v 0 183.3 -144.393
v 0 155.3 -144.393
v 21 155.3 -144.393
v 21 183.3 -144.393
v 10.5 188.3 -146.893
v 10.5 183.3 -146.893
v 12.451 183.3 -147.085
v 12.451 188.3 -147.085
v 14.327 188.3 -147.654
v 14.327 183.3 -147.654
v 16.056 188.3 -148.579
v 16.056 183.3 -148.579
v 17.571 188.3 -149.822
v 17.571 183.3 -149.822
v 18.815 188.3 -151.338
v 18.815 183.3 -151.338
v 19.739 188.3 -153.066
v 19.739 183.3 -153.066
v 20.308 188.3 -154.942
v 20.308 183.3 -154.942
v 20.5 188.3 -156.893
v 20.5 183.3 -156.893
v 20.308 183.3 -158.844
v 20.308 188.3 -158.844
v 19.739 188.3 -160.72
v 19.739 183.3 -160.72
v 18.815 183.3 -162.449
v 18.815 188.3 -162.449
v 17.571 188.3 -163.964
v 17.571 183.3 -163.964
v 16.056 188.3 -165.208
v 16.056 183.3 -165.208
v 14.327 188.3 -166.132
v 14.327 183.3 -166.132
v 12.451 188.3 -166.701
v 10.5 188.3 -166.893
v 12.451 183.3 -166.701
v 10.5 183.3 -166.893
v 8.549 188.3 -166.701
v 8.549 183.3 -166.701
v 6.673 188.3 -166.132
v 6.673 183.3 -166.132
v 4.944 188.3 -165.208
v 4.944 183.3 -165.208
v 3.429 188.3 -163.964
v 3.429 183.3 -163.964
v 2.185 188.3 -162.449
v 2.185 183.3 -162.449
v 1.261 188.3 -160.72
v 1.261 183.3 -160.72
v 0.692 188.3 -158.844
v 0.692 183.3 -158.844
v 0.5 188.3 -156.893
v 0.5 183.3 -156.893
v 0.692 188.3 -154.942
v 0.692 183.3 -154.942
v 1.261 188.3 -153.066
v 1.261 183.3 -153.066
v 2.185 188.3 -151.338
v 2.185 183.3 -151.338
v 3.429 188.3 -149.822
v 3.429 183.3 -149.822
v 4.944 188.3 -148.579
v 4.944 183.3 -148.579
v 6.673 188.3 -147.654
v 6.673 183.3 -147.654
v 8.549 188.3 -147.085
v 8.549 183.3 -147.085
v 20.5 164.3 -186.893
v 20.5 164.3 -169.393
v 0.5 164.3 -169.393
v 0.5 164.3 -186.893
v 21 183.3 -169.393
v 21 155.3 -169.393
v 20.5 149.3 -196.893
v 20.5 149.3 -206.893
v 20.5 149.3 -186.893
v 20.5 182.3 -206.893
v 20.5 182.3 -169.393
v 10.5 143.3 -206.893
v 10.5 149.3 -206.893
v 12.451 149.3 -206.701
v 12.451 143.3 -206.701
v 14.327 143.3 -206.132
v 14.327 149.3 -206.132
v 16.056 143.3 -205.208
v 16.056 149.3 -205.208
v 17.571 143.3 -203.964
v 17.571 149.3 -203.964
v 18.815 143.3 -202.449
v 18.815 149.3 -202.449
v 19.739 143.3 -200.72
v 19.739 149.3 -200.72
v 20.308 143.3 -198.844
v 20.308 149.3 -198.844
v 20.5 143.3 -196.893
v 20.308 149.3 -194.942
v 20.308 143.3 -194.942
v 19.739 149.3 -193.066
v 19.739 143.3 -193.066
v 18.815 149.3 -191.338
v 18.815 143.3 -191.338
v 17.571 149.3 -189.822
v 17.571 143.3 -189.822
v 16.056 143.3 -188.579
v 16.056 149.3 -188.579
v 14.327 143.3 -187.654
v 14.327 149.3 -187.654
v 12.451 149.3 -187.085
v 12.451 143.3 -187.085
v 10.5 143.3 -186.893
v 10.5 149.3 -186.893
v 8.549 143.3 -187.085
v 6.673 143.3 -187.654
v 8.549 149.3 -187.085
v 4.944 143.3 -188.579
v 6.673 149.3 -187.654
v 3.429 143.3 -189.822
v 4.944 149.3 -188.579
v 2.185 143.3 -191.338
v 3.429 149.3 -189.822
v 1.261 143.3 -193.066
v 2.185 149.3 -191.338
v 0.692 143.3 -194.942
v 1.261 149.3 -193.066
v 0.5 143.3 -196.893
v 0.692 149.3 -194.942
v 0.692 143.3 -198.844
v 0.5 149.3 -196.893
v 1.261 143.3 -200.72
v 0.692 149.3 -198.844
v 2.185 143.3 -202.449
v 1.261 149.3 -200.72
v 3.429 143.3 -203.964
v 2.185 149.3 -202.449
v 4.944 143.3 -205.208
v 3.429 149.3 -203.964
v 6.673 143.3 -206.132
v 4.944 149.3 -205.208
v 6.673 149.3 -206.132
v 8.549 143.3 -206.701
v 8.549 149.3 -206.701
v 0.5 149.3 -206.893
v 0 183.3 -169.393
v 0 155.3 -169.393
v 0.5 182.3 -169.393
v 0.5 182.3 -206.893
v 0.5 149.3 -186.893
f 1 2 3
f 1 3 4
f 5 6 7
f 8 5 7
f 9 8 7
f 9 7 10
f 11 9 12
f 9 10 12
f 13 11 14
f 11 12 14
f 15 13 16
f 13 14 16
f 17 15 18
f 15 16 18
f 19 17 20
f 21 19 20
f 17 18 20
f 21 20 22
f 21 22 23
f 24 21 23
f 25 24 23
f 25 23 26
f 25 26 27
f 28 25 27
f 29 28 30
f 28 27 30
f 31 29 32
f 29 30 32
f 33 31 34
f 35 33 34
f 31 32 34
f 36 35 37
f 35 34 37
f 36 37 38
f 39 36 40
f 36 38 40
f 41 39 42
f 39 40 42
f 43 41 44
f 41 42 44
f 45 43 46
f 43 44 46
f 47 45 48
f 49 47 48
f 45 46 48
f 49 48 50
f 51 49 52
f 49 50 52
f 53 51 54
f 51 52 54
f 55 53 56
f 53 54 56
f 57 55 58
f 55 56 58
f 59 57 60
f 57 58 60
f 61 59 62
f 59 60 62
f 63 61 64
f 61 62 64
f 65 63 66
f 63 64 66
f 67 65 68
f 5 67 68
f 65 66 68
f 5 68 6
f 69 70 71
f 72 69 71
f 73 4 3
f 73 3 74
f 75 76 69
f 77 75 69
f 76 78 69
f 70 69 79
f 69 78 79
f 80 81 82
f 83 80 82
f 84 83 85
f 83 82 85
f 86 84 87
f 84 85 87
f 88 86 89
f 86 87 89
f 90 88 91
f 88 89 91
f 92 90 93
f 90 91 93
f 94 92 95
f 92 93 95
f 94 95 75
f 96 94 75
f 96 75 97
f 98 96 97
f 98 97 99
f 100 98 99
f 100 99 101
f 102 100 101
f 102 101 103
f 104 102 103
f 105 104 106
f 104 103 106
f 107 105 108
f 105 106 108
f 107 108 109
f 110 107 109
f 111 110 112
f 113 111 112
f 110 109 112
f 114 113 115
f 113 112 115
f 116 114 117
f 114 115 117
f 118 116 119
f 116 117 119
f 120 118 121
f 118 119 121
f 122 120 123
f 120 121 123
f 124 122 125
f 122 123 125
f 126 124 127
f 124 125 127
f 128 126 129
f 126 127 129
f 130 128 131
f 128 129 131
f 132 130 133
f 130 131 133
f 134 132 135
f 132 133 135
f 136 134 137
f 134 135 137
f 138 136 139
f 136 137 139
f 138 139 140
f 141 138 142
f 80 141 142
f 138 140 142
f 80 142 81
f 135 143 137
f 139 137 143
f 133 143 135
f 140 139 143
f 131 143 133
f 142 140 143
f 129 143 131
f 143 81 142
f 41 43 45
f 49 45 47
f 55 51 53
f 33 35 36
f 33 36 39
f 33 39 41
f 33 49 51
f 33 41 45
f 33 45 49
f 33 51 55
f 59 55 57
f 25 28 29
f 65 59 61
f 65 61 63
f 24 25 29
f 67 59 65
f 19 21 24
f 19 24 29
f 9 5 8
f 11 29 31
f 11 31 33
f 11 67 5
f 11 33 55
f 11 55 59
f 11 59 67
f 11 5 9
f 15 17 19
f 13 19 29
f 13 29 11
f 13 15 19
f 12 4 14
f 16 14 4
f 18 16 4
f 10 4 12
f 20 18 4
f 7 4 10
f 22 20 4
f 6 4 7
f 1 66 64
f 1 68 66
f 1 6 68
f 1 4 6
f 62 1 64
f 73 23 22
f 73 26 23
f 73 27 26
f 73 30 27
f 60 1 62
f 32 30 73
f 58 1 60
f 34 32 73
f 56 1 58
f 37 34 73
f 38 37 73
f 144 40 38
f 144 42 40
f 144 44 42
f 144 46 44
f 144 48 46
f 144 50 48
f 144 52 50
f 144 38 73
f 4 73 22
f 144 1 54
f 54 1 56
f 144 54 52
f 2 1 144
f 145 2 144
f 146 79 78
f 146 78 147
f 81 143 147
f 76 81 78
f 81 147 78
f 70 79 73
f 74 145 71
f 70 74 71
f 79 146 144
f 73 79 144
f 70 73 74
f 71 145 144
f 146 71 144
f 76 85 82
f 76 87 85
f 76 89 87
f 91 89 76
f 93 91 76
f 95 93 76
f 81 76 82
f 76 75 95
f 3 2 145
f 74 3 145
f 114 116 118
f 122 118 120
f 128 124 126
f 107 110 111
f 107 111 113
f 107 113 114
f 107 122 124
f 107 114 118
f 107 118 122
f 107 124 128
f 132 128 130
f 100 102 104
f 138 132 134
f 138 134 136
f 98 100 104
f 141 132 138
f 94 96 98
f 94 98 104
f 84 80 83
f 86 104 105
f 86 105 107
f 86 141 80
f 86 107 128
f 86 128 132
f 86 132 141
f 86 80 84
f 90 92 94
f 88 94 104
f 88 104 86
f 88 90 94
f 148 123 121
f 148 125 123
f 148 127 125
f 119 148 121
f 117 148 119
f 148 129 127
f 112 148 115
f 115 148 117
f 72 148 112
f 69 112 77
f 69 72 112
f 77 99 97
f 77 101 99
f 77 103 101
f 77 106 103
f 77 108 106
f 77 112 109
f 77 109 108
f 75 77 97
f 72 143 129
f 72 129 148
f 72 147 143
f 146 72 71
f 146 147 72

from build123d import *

# Parameters (mm, degrees)
ESQUISSE1_W        = 25
ESQUISSE1_H        = 28
BOSS_EXTRU_1_DEPTH = 21
ESQUISSE2_W        = 20
ESQUISSE2_H        = 18
BOSS_EXTRU_2_DEPTH = 37.5
ESQUISSE3_W        = 20
ESQUISSE3_H        = 20
BOSS_EXTRU_3_DEPTH = 15
ESQUISSE5_R        = 10
BOSS_EXTRU_4_DEPTH = 5
ESQUISSE6_R        = 10
BOSS_EXTRU_5_DEPTH = 6


with BuildPart() as part:
    # Esquisse1 → Boss.-Extru.1 (new body)
    with BuildSketch(Plane(origin=(0, 0, 0), x_dir=(0, 0, -1), z_dir=(1, 0, 0))):
        with Locations((156.893217971, 169.300046999)):
            Rectangle(ESQUISSE1_W, ESQUISSE1_H)
    extrude(amount=BOSS_EXTRU_1_DEPTH)

    # Esquisse2 → Boss.-Extru.2 (add)
    with BuildSketch(Plane(origin=(0, 0, -169.393217971), x_dir=(-1, 0, 0), z_dir=(0, 0, -1))):
        with Locations((-10.5, 173.300046999)):
            Rectangle(ESQUISSE2_W, ESQUISSE2_H)
    extrude(amount=BOSS_EXTRU_2_DEPTH)

    # Esquisse3 → Boss.-Extru.3 (add)
    with BuildSketch(Plane.XZ.offset(-164.300046999)):
        with Locations((10.5, -196.893217971)):
            Rectangle(ESQUISSE3_W, ESQUISSE3_H)
    extrude(amount=BOSS_EXTRU_3_DEPTH)

    # Esquisse5 → Boss.-Extru.4 (add)
    with BuildSketch(Plane(origin=(0, 183.300046999, 0), x_dir=(1, 0, 0), z_dir=(0, 1, 0))):
        with Locations(Location((10.5, 156.893217971, 0), (0, 0, 270))):
            Circle(ESQUISSE5_R)
    extrude(amount=BOSS_EXTRU_4_DEPTH)

    # Esquisse6 → Boss.-Extru.5 (add)
    with BuildSketch(Plane(origin=(0, 149.300046999, 0), x_dir=(-1, 0, 0), z_dir=(0, -1, 0))):
        with Locations(Location((-10.5, 196.893217971, 0), (0, 0, 90))):
            Circle(ESQUISSE6_R)
    extrude(amount=BOSS_EXTRU_5_DEPTH)


solid = part.part
